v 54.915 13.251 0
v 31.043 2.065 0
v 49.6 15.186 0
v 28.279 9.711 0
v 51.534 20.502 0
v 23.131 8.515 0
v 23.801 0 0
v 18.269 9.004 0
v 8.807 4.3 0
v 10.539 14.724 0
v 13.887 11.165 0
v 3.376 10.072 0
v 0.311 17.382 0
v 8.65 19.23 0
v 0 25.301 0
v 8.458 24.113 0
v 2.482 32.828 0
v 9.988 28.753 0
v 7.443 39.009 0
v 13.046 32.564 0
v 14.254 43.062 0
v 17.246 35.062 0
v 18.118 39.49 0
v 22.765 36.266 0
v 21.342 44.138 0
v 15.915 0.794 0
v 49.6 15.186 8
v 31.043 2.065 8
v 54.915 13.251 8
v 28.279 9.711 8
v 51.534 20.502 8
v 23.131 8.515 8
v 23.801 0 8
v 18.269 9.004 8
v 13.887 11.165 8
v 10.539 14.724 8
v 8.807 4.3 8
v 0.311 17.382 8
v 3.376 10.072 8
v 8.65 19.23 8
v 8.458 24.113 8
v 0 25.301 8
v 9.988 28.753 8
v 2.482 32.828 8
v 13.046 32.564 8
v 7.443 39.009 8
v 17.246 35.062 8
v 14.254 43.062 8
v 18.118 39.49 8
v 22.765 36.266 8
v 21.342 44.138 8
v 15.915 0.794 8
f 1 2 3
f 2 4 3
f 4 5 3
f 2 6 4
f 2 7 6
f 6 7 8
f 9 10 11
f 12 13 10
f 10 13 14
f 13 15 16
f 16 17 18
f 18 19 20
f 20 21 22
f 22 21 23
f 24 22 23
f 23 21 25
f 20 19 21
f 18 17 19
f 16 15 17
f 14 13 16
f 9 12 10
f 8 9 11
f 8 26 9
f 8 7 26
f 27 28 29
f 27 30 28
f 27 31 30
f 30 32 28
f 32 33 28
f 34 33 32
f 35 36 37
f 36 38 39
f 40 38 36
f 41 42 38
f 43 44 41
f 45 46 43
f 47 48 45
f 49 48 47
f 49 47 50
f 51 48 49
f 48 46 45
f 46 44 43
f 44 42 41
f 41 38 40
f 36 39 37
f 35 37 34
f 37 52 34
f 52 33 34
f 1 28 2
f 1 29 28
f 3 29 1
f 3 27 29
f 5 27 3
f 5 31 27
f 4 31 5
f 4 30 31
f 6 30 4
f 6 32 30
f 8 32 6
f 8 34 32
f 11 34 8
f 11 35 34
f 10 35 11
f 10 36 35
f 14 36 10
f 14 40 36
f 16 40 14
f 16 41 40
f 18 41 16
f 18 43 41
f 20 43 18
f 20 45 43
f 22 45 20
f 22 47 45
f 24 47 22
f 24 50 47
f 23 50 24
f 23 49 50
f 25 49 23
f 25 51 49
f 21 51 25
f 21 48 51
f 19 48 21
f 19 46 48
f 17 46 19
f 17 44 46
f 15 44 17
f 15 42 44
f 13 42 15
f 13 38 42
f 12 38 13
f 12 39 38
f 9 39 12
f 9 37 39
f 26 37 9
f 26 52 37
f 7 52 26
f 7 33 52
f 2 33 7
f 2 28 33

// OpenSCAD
$fn = 32;

// ----------------------------------------------------------------------
// Hook plate: curl radius 18 mm over 205 degrees, 8 mm thick band
// ----------------------------------------------------------------------

// --- parameters (mm) ---
profile_height = 8;       // extrusion height
profile_points = 26;      // points of the closed outline

profile = [[18.118, 39.49], [21.342, 44.138], [14.254, 43.062], [7.443, 39.009], [2.482, 32.828], [0, 25.301], [0.311, 17.382], [3.376, 10.072], [8.807, 4.3], [15.915, 0.794], [23.801, 0], [31.043, 2.065], [54.915, 13.251], [49.6, 15.186], [51.534, 20.502], [28.279, 9.711], [23.131, 8.515], [18.269, 9.004], [13.887, 11.165], [10.539, 14.724], [8.65, 19.23], [8.458, 24.113], [9.988, 28.753], [13.046, 32.564], [17.246, 35.062], [22.765, 36.266]];  // single closed polygon, 26 points, counter clockwise

// --- the one profile operation ---
linear_extrude(height = profile_height) polygon(points = profile);
